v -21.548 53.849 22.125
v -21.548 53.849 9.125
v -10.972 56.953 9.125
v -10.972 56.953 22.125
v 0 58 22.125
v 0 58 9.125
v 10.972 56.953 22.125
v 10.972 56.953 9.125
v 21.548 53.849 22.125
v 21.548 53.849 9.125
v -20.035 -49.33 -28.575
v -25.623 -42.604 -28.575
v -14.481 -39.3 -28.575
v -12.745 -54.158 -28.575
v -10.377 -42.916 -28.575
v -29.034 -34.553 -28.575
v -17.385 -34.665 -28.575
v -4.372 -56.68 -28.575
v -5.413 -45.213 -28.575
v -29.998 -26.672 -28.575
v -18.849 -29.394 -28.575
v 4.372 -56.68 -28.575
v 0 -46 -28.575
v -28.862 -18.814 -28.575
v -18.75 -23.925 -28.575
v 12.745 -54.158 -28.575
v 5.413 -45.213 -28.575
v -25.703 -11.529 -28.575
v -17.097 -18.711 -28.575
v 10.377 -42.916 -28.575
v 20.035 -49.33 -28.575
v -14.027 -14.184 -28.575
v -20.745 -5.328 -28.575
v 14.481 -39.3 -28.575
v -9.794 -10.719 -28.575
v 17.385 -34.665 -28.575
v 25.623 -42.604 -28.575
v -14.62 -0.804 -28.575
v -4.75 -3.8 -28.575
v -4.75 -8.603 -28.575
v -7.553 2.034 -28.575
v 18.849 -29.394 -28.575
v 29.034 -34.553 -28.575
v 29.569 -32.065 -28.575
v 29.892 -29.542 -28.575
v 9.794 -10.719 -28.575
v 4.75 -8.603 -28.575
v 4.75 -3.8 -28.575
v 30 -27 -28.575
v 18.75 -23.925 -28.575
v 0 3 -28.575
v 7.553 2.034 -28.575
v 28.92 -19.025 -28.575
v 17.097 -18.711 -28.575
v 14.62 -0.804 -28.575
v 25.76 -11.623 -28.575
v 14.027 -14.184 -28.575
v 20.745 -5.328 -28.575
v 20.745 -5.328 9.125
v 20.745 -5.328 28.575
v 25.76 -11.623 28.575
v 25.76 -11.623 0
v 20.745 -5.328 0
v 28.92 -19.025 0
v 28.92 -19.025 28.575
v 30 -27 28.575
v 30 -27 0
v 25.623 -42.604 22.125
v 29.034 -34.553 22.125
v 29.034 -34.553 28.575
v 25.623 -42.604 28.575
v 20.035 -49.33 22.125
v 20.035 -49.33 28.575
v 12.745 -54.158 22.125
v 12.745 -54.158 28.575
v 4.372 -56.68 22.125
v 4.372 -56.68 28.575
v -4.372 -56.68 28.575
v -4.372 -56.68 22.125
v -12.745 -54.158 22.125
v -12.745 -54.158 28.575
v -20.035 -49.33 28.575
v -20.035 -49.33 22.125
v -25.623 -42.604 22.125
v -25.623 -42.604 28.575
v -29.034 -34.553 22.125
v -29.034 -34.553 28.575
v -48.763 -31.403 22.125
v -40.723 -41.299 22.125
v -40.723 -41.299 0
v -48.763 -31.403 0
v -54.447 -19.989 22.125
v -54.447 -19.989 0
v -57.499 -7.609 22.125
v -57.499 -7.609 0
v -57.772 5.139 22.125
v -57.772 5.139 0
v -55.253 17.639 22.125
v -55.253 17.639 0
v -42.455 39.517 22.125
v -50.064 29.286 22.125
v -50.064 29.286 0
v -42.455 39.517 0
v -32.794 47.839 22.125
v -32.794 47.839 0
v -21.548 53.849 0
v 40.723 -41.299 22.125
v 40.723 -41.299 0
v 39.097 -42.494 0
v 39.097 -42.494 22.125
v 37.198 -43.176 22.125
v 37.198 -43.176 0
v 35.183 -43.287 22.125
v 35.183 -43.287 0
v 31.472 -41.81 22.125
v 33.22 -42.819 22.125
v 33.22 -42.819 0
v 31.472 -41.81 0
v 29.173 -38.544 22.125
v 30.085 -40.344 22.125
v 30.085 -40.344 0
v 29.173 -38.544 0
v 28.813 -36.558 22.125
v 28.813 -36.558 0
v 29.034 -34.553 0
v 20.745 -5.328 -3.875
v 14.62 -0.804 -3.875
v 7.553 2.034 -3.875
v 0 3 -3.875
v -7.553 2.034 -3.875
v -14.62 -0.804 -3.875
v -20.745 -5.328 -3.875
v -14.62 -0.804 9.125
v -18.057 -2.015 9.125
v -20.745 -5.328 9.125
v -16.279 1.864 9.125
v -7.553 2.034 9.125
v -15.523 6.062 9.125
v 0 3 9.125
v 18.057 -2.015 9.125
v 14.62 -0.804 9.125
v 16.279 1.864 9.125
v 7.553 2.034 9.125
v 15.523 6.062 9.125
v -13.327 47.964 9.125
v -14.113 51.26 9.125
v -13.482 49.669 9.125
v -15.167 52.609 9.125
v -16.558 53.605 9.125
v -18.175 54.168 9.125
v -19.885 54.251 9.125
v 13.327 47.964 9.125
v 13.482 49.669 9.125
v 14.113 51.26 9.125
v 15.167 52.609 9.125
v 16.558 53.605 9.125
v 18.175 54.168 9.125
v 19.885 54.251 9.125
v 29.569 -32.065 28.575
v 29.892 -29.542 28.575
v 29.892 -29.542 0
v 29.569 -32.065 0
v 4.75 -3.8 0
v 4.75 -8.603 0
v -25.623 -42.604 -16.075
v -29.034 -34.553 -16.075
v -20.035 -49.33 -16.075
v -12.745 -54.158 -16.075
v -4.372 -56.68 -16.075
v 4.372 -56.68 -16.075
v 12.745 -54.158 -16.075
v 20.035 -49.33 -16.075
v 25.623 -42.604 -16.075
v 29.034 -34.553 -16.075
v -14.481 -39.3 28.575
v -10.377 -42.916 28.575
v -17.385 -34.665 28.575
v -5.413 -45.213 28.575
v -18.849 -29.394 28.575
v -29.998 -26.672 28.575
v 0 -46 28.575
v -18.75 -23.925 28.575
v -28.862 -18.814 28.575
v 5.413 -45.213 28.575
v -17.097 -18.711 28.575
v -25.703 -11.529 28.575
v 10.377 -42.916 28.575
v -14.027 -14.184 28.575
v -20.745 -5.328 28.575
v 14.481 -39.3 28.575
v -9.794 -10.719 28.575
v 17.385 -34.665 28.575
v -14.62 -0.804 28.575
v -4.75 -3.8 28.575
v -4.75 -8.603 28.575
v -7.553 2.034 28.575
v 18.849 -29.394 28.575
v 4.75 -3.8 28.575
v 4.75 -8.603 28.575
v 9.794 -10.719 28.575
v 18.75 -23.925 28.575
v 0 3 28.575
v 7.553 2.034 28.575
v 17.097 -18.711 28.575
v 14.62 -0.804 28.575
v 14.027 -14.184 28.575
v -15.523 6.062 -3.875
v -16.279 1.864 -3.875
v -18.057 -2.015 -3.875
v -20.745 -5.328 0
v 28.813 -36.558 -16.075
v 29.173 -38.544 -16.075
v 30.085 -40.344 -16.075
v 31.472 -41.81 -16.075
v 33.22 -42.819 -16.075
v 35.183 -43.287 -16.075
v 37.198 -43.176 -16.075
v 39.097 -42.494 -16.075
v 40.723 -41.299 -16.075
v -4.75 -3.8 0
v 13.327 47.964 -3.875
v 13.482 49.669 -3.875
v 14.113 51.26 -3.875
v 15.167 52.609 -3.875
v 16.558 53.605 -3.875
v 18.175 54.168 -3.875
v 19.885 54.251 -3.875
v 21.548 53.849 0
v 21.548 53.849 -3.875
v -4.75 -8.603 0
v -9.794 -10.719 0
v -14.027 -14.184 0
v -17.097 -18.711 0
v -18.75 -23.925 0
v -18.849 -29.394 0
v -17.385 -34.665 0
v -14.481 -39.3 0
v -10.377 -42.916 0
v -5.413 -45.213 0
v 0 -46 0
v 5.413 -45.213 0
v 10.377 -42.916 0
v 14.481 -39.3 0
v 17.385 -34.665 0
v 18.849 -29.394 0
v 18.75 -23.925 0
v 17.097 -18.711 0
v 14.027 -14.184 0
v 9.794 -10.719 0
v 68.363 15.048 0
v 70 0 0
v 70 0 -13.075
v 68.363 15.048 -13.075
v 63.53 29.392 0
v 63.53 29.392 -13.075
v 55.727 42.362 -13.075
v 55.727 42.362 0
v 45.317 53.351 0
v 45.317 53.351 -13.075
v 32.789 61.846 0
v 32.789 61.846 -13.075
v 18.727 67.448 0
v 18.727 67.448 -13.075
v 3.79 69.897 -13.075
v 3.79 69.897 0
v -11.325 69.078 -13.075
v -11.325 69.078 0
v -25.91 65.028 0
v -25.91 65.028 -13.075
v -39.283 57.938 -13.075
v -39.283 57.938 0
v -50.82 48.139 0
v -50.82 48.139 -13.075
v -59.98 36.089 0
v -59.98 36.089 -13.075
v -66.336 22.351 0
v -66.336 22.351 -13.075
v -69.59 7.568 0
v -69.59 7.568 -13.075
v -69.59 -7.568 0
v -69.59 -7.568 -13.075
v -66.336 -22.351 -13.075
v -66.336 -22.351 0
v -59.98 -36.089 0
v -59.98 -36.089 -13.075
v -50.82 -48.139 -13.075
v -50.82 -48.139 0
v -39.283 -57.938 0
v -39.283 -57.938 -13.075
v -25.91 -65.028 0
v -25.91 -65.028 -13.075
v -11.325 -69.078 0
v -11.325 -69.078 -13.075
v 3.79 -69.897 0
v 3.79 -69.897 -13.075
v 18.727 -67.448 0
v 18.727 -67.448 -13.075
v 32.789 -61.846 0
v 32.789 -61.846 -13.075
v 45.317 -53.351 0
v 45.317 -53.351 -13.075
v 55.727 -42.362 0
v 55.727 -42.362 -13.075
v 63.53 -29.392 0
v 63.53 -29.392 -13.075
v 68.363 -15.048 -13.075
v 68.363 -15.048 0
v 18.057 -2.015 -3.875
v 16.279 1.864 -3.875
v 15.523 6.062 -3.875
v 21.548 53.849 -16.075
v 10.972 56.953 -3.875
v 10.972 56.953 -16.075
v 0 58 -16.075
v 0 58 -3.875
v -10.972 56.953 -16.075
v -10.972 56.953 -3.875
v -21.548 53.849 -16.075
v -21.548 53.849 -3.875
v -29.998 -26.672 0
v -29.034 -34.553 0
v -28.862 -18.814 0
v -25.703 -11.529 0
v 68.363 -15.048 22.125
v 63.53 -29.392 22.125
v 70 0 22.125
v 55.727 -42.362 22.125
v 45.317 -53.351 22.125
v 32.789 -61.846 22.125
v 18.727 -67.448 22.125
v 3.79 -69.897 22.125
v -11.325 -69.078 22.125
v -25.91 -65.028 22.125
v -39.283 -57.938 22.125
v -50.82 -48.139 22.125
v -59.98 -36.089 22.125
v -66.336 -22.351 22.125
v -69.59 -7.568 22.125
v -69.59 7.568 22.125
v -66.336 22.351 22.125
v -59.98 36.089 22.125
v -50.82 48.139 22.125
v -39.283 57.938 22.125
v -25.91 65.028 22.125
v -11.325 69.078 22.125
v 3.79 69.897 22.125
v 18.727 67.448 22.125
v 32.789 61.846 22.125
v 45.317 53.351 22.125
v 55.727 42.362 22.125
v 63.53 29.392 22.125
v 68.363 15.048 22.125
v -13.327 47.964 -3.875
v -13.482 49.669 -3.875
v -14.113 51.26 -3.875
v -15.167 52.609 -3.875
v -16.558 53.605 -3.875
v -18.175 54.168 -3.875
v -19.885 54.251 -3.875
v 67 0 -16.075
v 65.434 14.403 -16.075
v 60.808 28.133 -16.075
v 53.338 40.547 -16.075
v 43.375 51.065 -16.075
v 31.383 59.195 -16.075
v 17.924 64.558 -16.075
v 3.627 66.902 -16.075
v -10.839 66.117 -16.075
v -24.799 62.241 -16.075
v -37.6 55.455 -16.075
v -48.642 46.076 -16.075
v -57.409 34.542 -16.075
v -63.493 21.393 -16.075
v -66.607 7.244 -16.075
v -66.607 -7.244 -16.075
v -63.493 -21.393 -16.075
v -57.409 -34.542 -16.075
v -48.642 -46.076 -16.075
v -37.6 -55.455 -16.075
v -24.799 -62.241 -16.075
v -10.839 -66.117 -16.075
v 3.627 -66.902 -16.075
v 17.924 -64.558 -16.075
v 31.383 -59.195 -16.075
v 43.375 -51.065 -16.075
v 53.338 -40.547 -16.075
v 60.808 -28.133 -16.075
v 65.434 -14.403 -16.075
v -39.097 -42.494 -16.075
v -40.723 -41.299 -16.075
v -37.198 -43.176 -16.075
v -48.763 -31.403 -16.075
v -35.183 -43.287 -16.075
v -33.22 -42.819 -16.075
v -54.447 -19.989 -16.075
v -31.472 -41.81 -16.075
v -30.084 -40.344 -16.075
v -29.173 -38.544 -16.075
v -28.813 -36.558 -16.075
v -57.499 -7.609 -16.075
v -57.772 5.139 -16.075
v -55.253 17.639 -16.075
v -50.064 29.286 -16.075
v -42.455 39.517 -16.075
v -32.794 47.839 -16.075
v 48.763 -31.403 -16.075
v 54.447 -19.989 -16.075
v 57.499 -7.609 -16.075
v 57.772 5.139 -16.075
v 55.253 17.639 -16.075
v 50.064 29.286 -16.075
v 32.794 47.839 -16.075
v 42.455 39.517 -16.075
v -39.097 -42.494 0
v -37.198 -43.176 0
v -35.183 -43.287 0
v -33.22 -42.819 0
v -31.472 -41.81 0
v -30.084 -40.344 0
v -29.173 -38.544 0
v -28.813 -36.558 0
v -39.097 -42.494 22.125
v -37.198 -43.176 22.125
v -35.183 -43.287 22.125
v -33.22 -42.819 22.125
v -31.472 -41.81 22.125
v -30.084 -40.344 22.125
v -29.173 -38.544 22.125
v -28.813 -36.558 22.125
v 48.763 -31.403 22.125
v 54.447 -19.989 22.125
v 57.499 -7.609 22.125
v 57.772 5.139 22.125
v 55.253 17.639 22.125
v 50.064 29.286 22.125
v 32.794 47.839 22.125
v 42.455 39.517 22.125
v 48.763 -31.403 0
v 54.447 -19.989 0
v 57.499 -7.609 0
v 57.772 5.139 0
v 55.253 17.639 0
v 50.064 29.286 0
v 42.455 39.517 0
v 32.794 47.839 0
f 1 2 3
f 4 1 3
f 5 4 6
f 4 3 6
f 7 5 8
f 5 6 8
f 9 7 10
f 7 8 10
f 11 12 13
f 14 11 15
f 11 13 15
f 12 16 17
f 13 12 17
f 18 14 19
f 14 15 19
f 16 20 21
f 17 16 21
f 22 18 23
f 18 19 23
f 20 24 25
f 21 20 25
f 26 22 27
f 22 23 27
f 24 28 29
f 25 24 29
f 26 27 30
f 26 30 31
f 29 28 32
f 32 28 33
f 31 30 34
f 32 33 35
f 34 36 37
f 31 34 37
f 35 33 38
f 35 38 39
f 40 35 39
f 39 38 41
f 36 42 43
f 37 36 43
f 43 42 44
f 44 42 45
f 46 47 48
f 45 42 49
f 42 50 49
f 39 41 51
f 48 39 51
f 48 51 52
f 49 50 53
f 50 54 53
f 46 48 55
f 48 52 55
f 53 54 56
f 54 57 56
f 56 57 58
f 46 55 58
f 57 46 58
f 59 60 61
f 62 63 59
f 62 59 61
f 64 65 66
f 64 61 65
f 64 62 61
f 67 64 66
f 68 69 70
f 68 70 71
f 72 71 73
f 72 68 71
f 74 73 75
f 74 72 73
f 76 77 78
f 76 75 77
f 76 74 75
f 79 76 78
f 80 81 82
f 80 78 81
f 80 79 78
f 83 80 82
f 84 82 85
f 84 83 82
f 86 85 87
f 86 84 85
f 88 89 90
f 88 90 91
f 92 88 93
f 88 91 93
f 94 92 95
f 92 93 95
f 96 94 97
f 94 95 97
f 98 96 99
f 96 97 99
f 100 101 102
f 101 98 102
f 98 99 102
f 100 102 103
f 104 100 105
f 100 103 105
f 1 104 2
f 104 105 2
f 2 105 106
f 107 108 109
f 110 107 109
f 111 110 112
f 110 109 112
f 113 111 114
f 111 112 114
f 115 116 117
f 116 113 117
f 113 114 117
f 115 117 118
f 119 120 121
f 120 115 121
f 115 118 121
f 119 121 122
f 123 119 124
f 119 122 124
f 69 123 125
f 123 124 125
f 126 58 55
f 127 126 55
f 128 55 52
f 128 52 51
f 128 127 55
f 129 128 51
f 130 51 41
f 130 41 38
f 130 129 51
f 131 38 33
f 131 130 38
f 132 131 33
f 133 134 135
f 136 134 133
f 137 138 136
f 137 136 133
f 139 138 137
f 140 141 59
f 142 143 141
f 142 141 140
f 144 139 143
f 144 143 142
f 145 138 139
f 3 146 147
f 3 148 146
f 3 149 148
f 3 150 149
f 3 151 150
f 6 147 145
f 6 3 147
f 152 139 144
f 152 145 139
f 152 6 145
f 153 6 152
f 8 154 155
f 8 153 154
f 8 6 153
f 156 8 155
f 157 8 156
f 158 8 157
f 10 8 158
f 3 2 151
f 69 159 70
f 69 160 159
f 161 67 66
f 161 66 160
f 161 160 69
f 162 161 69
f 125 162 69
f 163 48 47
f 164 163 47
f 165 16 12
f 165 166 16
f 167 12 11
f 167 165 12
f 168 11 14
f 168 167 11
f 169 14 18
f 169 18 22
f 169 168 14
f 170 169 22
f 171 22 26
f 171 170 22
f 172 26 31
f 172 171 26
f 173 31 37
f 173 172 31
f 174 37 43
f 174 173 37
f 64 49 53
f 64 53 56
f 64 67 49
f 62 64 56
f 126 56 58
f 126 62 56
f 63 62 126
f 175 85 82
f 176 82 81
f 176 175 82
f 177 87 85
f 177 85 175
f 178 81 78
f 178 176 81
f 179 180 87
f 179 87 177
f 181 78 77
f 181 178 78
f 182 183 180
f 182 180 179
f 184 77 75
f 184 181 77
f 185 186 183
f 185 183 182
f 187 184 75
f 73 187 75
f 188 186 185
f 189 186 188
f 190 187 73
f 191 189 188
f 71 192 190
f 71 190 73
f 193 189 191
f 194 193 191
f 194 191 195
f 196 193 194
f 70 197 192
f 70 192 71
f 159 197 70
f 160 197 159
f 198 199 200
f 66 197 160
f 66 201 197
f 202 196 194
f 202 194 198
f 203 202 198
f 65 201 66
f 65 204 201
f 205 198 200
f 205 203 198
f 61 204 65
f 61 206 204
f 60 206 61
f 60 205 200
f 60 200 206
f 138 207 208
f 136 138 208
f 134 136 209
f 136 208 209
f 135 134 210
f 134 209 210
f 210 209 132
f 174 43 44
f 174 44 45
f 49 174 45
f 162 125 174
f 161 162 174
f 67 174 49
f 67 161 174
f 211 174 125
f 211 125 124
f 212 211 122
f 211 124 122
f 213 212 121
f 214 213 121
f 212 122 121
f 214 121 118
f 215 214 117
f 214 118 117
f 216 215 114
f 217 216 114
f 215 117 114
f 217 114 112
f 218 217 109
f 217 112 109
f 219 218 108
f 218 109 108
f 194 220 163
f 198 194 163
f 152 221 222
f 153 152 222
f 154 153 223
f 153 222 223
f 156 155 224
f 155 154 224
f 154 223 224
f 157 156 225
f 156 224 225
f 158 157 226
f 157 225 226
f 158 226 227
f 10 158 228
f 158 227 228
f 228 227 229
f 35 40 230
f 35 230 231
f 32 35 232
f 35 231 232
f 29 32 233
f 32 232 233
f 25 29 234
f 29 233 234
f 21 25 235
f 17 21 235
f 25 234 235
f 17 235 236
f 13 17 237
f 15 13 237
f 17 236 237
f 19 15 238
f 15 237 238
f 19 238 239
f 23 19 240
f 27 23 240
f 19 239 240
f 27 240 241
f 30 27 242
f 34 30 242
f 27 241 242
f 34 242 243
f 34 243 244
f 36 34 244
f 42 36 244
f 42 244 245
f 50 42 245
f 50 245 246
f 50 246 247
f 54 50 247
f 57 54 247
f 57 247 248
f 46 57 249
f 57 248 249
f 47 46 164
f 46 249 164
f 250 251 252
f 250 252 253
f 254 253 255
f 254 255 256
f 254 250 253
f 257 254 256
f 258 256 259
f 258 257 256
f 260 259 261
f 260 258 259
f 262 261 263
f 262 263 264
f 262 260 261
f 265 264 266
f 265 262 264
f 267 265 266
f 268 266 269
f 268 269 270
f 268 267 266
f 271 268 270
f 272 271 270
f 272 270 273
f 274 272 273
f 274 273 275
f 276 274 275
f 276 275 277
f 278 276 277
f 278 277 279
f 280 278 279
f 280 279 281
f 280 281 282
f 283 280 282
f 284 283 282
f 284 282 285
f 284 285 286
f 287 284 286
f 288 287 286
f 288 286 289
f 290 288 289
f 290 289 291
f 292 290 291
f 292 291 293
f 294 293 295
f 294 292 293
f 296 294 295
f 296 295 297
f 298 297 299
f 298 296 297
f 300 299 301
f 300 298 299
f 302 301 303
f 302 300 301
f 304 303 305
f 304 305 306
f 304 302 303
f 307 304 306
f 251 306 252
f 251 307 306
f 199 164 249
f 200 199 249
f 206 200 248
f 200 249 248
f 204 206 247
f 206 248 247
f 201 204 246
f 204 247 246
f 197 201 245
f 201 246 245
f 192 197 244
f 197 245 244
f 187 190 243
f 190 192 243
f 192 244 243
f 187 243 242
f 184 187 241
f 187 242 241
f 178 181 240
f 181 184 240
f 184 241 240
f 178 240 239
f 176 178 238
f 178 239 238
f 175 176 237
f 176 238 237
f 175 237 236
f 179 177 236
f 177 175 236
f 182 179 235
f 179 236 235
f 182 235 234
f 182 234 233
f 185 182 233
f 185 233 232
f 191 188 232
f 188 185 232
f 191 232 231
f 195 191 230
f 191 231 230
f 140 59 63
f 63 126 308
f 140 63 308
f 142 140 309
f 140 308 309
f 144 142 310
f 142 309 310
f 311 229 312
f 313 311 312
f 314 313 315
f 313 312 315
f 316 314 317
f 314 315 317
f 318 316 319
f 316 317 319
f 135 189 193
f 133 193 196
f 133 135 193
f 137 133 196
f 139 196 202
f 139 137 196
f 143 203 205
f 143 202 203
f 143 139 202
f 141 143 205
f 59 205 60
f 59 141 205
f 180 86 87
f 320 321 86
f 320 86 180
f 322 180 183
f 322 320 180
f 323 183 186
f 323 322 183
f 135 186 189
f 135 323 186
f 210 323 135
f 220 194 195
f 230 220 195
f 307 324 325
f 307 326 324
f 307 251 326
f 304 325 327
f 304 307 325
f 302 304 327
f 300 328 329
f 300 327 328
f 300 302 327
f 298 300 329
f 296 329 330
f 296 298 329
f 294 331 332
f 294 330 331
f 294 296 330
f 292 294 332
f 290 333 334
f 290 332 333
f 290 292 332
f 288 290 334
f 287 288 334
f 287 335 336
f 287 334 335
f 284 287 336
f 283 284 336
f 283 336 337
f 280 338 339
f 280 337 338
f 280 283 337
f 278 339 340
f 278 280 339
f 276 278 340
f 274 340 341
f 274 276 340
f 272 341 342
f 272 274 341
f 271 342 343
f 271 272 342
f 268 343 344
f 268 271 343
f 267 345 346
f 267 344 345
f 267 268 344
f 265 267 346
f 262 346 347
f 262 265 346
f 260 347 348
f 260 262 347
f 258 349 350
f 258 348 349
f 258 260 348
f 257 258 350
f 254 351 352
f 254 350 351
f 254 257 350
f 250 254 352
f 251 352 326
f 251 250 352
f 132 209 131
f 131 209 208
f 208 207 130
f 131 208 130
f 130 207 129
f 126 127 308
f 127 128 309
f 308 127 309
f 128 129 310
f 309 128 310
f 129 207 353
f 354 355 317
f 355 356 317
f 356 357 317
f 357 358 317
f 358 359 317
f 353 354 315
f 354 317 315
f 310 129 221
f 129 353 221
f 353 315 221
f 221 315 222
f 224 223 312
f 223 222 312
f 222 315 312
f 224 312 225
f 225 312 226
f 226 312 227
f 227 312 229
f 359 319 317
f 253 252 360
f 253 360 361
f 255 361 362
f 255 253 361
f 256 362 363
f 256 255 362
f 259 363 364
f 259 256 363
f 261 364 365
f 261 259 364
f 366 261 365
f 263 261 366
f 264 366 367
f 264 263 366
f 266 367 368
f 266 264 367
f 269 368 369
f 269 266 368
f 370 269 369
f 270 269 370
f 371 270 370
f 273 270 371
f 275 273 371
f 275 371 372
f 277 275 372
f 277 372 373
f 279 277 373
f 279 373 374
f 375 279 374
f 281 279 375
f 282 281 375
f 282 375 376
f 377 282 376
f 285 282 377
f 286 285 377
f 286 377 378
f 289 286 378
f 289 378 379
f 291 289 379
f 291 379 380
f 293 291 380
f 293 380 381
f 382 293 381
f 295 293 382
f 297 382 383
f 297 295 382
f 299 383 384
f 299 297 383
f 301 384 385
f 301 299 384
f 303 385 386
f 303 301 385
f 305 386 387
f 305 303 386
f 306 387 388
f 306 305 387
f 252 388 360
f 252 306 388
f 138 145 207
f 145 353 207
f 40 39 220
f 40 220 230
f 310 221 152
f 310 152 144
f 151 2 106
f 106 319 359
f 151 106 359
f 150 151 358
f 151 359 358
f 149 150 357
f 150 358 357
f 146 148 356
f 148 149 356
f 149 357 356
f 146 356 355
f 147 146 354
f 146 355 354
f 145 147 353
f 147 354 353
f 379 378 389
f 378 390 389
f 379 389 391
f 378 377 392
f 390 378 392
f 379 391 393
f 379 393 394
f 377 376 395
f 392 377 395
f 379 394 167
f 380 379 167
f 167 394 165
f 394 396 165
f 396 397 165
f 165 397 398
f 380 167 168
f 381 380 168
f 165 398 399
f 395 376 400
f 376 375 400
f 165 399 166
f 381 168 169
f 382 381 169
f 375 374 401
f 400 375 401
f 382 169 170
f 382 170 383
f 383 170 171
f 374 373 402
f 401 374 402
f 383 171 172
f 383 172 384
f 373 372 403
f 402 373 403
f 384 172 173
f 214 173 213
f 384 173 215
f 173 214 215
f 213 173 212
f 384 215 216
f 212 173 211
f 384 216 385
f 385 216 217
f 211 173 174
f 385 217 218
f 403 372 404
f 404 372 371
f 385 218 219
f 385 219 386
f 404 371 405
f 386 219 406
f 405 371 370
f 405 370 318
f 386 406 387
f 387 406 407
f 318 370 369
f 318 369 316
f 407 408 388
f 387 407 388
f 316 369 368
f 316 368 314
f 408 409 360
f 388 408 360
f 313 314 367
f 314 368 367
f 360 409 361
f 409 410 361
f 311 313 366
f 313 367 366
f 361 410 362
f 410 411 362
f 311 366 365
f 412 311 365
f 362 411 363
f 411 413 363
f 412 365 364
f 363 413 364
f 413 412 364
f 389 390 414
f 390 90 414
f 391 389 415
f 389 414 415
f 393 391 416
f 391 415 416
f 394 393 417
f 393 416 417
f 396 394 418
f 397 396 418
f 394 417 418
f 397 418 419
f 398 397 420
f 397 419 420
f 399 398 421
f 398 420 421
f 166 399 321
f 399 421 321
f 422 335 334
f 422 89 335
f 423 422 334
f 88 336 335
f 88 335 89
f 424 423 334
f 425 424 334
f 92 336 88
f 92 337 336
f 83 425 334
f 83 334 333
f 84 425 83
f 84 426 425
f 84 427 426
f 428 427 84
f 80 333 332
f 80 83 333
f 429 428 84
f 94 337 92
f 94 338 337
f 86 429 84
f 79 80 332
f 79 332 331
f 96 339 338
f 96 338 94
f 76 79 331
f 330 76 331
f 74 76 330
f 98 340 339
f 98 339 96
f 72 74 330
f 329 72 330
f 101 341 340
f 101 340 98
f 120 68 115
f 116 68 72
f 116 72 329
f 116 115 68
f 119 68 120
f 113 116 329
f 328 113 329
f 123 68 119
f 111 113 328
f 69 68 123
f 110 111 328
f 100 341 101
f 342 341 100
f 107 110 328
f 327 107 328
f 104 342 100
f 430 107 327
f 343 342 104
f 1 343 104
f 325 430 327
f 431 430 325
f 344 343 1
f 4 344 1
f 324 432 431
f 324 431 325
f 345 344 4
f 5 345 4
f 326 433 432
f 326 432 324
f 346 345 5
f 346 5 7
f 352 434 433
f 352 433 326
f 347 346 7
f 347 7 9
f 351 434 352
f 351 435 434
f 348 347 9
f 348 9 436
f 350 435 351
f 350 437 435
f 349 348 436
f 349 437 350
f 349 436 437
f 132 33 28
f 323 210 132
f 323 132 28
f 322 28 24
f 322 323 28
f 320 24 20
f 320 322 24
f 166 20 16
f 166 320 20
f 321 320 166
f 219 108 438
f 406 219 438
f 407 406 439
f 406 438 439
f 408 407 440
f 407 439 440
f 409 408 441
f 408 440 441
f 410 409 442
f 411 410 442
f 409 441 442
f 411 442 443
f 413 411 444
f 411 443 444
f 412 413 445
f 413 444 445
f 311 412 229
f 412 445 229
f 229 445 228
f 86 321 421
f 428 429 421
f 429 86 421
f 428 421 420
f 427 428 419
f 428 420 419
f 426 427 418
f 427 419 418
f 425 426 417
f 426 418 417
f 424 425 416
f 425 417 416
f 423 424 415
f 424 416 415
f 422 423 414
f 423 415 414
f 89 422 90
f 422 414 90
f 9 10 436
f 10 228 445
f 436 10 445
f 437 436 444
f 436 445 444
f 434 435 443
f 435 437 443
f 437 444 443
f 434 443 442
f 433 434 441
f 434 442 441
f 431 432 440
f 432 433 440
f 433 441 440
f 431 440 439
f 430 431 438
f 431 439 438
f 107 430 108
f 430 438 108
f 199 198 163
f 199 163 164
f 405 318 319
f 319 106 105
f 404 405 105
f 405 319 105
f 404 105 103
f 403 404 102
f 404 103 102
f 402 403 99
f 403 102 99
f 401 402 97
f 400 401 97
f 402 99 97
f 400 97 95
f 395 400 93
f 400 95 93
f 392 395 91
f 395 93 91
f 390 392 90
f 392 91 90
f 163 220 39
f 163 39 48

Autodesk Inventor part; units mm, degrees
ref_plane "YZ Plane" through (0, 0, 0) normal (1, 0, 0) x (0, 1, 0)
ref_plane "XY Plane" through (0, 0, 0) normal (0, 0, 1) x (1, 0, 0)
sketch "Sketch1" plane through (0, 0, 0) normal (0, 0, 1) x (1, 0, 0)
  circle A0 centre (0, 0) radius 70
  arc A1 (40.7232, -41.2992) -> (-40.7232, -41.2992) centre (0, 0) ccw
  arc A2 (-4.75, -8.6033) -> (4.75, -8.6033) centre (0, -27) ccw
  circle A3 centre (0, -27) radius 30
  arc A4 (29.0338, -34.5526) -> (40.7232, -41.2992) centre (35.8083, -36.3148) ccw
  arc A5 (-40.7232, -41.2992) -> (-29.0338, -34.5526) centre (-35.8083, -36.3148) ccw
  line L0 (0, -46) -> (0, -3.8) construction
  line L1 (-4.75, -3.8) -> (4.75, -3.8)
  line L2 (-4.75, -3.8) -> (-4.75, -8.6033)
  line L3 (4.75, -3.8) -> (4.75, -8.6033)
  line L4 (-19, 54.7996) -> (19, 54.7996) construction
  line L5 (-32.5, 20.2582) -> (32.5, 20.2582) construction
  line L6 (0, -98) -> (0, 98) construction
  arc A6 (15.5233, 6.0625) -> (20.7447, -5.3284) centre (32.5, 6.9522) ccw
  arc A7 (21.5482, 53.8486) -> (13.3273, 47.9641) centre (19.3191, 48.2781) ccw
  line L7 (13.3273, 47.9641) -> (15.5233, 6.0625)
  arc A8 (-13.3273, 47.9641) -> (-21.5482, 53.8486) centre (-19.3191, 48.2781) ccw
  arc A9 (-20.7447, -5.3284) -> (-15.5233, 6.0625) centre (-32.5, 6.9522) ccw
  line L8 (-13.3273, 47.9641) -> (-15.5233, 6.0625)
  point P0 (0, -3.8)
  point P1 (0, 20.2582)
  dimension "d0" = 70
  dimension "d1" = 58
  dimension "d2" = 19
  dimension "d3" = 30
  dimension "d4" = 27
  dimension "d5" = 42.2
  dimension "d6" = 9.5
  dimension "d7" = 38
  dimension "d8" = 65
  dimension "d13" = 7
  dimension "d14" = 7
  dimension "d15" = 3.8
  dimension "d16" = 17
  dimension "d17" = 6
  dimension "d18" = 3
  dimension "d19" = 6
  dimension "d20" = 17
  dimension "d21" = 3
extrude "Extrusion1" add sketch "Sketch1" along normal mid plane 57.15 contours A3
ref_plane "Work Plane1" through (0, 3, 0) normal (0, 1, 0) x (-1, 0, 0)
sketch "Sketch2" plane through (0, 3, 0) normal (0, 1, 0) x (-1, 0, 0)
  line L0 (30, -28.575) -> (-30, -28.575) projected
  line L1 (-30, 28.575) -> (30, 28.575) projected
  line L2 (0, 28.575) -> (0, 9.125)
  line L3 (0, -28.575) -> (0, -3.875)
  point P0 (0, 0)
  dimension "d25" = 19.45
  dimension "d26" = 24.7
  dimension "d27" = 3.875
  dimension "d28" = 9.125
extrude "Extrusion2" add sketch "Sketch1" along normal blind 9.125 and the other way blind 3.875 contours A7 L7 A6 A3 A9 L8 A8 A1
sketch "Sketch3" plane through (0, 3, 0) normal (0, 1, 0) x (-1, 0, 0)
  line L0 (20.7447, -3.875) -> (-20.7447, -3.875) projected
  line L1 (-20.7447, -3.875) -> (-20.7447, 9.125) projected
  line L2 (-20.7447, 9.125) -> (20.7447, 9.125) projected
  line L3 (20.7447, -3.875) -> (20.7447, 9.125) projected
  line L4 (30, -28.575) -> (-30, -28.575) projected
  line L5 (-30, 28.575) -> (30, 28.575) projected
  line L6 (0, 28.575) -> (0, 22.125)
  line L7 (0, -28.575) -> (0, -16.075)
  point P0 (0, 0)
  dimension "d33" = 6.45
  dimension "d34" = 12.5
  dimension "d35" = 22.125
  dimension "d36" = 16.075
extrude "Extrusion3" add sketch "Sketch1" along normal blind 22.125 and the other way blind 16.075 contours A0
chamfer "Chamfer1" distance 3 angle 45 1 edges at (-70, 0, -16.075)
properties part number "Piesa24_DonisanEnya"
